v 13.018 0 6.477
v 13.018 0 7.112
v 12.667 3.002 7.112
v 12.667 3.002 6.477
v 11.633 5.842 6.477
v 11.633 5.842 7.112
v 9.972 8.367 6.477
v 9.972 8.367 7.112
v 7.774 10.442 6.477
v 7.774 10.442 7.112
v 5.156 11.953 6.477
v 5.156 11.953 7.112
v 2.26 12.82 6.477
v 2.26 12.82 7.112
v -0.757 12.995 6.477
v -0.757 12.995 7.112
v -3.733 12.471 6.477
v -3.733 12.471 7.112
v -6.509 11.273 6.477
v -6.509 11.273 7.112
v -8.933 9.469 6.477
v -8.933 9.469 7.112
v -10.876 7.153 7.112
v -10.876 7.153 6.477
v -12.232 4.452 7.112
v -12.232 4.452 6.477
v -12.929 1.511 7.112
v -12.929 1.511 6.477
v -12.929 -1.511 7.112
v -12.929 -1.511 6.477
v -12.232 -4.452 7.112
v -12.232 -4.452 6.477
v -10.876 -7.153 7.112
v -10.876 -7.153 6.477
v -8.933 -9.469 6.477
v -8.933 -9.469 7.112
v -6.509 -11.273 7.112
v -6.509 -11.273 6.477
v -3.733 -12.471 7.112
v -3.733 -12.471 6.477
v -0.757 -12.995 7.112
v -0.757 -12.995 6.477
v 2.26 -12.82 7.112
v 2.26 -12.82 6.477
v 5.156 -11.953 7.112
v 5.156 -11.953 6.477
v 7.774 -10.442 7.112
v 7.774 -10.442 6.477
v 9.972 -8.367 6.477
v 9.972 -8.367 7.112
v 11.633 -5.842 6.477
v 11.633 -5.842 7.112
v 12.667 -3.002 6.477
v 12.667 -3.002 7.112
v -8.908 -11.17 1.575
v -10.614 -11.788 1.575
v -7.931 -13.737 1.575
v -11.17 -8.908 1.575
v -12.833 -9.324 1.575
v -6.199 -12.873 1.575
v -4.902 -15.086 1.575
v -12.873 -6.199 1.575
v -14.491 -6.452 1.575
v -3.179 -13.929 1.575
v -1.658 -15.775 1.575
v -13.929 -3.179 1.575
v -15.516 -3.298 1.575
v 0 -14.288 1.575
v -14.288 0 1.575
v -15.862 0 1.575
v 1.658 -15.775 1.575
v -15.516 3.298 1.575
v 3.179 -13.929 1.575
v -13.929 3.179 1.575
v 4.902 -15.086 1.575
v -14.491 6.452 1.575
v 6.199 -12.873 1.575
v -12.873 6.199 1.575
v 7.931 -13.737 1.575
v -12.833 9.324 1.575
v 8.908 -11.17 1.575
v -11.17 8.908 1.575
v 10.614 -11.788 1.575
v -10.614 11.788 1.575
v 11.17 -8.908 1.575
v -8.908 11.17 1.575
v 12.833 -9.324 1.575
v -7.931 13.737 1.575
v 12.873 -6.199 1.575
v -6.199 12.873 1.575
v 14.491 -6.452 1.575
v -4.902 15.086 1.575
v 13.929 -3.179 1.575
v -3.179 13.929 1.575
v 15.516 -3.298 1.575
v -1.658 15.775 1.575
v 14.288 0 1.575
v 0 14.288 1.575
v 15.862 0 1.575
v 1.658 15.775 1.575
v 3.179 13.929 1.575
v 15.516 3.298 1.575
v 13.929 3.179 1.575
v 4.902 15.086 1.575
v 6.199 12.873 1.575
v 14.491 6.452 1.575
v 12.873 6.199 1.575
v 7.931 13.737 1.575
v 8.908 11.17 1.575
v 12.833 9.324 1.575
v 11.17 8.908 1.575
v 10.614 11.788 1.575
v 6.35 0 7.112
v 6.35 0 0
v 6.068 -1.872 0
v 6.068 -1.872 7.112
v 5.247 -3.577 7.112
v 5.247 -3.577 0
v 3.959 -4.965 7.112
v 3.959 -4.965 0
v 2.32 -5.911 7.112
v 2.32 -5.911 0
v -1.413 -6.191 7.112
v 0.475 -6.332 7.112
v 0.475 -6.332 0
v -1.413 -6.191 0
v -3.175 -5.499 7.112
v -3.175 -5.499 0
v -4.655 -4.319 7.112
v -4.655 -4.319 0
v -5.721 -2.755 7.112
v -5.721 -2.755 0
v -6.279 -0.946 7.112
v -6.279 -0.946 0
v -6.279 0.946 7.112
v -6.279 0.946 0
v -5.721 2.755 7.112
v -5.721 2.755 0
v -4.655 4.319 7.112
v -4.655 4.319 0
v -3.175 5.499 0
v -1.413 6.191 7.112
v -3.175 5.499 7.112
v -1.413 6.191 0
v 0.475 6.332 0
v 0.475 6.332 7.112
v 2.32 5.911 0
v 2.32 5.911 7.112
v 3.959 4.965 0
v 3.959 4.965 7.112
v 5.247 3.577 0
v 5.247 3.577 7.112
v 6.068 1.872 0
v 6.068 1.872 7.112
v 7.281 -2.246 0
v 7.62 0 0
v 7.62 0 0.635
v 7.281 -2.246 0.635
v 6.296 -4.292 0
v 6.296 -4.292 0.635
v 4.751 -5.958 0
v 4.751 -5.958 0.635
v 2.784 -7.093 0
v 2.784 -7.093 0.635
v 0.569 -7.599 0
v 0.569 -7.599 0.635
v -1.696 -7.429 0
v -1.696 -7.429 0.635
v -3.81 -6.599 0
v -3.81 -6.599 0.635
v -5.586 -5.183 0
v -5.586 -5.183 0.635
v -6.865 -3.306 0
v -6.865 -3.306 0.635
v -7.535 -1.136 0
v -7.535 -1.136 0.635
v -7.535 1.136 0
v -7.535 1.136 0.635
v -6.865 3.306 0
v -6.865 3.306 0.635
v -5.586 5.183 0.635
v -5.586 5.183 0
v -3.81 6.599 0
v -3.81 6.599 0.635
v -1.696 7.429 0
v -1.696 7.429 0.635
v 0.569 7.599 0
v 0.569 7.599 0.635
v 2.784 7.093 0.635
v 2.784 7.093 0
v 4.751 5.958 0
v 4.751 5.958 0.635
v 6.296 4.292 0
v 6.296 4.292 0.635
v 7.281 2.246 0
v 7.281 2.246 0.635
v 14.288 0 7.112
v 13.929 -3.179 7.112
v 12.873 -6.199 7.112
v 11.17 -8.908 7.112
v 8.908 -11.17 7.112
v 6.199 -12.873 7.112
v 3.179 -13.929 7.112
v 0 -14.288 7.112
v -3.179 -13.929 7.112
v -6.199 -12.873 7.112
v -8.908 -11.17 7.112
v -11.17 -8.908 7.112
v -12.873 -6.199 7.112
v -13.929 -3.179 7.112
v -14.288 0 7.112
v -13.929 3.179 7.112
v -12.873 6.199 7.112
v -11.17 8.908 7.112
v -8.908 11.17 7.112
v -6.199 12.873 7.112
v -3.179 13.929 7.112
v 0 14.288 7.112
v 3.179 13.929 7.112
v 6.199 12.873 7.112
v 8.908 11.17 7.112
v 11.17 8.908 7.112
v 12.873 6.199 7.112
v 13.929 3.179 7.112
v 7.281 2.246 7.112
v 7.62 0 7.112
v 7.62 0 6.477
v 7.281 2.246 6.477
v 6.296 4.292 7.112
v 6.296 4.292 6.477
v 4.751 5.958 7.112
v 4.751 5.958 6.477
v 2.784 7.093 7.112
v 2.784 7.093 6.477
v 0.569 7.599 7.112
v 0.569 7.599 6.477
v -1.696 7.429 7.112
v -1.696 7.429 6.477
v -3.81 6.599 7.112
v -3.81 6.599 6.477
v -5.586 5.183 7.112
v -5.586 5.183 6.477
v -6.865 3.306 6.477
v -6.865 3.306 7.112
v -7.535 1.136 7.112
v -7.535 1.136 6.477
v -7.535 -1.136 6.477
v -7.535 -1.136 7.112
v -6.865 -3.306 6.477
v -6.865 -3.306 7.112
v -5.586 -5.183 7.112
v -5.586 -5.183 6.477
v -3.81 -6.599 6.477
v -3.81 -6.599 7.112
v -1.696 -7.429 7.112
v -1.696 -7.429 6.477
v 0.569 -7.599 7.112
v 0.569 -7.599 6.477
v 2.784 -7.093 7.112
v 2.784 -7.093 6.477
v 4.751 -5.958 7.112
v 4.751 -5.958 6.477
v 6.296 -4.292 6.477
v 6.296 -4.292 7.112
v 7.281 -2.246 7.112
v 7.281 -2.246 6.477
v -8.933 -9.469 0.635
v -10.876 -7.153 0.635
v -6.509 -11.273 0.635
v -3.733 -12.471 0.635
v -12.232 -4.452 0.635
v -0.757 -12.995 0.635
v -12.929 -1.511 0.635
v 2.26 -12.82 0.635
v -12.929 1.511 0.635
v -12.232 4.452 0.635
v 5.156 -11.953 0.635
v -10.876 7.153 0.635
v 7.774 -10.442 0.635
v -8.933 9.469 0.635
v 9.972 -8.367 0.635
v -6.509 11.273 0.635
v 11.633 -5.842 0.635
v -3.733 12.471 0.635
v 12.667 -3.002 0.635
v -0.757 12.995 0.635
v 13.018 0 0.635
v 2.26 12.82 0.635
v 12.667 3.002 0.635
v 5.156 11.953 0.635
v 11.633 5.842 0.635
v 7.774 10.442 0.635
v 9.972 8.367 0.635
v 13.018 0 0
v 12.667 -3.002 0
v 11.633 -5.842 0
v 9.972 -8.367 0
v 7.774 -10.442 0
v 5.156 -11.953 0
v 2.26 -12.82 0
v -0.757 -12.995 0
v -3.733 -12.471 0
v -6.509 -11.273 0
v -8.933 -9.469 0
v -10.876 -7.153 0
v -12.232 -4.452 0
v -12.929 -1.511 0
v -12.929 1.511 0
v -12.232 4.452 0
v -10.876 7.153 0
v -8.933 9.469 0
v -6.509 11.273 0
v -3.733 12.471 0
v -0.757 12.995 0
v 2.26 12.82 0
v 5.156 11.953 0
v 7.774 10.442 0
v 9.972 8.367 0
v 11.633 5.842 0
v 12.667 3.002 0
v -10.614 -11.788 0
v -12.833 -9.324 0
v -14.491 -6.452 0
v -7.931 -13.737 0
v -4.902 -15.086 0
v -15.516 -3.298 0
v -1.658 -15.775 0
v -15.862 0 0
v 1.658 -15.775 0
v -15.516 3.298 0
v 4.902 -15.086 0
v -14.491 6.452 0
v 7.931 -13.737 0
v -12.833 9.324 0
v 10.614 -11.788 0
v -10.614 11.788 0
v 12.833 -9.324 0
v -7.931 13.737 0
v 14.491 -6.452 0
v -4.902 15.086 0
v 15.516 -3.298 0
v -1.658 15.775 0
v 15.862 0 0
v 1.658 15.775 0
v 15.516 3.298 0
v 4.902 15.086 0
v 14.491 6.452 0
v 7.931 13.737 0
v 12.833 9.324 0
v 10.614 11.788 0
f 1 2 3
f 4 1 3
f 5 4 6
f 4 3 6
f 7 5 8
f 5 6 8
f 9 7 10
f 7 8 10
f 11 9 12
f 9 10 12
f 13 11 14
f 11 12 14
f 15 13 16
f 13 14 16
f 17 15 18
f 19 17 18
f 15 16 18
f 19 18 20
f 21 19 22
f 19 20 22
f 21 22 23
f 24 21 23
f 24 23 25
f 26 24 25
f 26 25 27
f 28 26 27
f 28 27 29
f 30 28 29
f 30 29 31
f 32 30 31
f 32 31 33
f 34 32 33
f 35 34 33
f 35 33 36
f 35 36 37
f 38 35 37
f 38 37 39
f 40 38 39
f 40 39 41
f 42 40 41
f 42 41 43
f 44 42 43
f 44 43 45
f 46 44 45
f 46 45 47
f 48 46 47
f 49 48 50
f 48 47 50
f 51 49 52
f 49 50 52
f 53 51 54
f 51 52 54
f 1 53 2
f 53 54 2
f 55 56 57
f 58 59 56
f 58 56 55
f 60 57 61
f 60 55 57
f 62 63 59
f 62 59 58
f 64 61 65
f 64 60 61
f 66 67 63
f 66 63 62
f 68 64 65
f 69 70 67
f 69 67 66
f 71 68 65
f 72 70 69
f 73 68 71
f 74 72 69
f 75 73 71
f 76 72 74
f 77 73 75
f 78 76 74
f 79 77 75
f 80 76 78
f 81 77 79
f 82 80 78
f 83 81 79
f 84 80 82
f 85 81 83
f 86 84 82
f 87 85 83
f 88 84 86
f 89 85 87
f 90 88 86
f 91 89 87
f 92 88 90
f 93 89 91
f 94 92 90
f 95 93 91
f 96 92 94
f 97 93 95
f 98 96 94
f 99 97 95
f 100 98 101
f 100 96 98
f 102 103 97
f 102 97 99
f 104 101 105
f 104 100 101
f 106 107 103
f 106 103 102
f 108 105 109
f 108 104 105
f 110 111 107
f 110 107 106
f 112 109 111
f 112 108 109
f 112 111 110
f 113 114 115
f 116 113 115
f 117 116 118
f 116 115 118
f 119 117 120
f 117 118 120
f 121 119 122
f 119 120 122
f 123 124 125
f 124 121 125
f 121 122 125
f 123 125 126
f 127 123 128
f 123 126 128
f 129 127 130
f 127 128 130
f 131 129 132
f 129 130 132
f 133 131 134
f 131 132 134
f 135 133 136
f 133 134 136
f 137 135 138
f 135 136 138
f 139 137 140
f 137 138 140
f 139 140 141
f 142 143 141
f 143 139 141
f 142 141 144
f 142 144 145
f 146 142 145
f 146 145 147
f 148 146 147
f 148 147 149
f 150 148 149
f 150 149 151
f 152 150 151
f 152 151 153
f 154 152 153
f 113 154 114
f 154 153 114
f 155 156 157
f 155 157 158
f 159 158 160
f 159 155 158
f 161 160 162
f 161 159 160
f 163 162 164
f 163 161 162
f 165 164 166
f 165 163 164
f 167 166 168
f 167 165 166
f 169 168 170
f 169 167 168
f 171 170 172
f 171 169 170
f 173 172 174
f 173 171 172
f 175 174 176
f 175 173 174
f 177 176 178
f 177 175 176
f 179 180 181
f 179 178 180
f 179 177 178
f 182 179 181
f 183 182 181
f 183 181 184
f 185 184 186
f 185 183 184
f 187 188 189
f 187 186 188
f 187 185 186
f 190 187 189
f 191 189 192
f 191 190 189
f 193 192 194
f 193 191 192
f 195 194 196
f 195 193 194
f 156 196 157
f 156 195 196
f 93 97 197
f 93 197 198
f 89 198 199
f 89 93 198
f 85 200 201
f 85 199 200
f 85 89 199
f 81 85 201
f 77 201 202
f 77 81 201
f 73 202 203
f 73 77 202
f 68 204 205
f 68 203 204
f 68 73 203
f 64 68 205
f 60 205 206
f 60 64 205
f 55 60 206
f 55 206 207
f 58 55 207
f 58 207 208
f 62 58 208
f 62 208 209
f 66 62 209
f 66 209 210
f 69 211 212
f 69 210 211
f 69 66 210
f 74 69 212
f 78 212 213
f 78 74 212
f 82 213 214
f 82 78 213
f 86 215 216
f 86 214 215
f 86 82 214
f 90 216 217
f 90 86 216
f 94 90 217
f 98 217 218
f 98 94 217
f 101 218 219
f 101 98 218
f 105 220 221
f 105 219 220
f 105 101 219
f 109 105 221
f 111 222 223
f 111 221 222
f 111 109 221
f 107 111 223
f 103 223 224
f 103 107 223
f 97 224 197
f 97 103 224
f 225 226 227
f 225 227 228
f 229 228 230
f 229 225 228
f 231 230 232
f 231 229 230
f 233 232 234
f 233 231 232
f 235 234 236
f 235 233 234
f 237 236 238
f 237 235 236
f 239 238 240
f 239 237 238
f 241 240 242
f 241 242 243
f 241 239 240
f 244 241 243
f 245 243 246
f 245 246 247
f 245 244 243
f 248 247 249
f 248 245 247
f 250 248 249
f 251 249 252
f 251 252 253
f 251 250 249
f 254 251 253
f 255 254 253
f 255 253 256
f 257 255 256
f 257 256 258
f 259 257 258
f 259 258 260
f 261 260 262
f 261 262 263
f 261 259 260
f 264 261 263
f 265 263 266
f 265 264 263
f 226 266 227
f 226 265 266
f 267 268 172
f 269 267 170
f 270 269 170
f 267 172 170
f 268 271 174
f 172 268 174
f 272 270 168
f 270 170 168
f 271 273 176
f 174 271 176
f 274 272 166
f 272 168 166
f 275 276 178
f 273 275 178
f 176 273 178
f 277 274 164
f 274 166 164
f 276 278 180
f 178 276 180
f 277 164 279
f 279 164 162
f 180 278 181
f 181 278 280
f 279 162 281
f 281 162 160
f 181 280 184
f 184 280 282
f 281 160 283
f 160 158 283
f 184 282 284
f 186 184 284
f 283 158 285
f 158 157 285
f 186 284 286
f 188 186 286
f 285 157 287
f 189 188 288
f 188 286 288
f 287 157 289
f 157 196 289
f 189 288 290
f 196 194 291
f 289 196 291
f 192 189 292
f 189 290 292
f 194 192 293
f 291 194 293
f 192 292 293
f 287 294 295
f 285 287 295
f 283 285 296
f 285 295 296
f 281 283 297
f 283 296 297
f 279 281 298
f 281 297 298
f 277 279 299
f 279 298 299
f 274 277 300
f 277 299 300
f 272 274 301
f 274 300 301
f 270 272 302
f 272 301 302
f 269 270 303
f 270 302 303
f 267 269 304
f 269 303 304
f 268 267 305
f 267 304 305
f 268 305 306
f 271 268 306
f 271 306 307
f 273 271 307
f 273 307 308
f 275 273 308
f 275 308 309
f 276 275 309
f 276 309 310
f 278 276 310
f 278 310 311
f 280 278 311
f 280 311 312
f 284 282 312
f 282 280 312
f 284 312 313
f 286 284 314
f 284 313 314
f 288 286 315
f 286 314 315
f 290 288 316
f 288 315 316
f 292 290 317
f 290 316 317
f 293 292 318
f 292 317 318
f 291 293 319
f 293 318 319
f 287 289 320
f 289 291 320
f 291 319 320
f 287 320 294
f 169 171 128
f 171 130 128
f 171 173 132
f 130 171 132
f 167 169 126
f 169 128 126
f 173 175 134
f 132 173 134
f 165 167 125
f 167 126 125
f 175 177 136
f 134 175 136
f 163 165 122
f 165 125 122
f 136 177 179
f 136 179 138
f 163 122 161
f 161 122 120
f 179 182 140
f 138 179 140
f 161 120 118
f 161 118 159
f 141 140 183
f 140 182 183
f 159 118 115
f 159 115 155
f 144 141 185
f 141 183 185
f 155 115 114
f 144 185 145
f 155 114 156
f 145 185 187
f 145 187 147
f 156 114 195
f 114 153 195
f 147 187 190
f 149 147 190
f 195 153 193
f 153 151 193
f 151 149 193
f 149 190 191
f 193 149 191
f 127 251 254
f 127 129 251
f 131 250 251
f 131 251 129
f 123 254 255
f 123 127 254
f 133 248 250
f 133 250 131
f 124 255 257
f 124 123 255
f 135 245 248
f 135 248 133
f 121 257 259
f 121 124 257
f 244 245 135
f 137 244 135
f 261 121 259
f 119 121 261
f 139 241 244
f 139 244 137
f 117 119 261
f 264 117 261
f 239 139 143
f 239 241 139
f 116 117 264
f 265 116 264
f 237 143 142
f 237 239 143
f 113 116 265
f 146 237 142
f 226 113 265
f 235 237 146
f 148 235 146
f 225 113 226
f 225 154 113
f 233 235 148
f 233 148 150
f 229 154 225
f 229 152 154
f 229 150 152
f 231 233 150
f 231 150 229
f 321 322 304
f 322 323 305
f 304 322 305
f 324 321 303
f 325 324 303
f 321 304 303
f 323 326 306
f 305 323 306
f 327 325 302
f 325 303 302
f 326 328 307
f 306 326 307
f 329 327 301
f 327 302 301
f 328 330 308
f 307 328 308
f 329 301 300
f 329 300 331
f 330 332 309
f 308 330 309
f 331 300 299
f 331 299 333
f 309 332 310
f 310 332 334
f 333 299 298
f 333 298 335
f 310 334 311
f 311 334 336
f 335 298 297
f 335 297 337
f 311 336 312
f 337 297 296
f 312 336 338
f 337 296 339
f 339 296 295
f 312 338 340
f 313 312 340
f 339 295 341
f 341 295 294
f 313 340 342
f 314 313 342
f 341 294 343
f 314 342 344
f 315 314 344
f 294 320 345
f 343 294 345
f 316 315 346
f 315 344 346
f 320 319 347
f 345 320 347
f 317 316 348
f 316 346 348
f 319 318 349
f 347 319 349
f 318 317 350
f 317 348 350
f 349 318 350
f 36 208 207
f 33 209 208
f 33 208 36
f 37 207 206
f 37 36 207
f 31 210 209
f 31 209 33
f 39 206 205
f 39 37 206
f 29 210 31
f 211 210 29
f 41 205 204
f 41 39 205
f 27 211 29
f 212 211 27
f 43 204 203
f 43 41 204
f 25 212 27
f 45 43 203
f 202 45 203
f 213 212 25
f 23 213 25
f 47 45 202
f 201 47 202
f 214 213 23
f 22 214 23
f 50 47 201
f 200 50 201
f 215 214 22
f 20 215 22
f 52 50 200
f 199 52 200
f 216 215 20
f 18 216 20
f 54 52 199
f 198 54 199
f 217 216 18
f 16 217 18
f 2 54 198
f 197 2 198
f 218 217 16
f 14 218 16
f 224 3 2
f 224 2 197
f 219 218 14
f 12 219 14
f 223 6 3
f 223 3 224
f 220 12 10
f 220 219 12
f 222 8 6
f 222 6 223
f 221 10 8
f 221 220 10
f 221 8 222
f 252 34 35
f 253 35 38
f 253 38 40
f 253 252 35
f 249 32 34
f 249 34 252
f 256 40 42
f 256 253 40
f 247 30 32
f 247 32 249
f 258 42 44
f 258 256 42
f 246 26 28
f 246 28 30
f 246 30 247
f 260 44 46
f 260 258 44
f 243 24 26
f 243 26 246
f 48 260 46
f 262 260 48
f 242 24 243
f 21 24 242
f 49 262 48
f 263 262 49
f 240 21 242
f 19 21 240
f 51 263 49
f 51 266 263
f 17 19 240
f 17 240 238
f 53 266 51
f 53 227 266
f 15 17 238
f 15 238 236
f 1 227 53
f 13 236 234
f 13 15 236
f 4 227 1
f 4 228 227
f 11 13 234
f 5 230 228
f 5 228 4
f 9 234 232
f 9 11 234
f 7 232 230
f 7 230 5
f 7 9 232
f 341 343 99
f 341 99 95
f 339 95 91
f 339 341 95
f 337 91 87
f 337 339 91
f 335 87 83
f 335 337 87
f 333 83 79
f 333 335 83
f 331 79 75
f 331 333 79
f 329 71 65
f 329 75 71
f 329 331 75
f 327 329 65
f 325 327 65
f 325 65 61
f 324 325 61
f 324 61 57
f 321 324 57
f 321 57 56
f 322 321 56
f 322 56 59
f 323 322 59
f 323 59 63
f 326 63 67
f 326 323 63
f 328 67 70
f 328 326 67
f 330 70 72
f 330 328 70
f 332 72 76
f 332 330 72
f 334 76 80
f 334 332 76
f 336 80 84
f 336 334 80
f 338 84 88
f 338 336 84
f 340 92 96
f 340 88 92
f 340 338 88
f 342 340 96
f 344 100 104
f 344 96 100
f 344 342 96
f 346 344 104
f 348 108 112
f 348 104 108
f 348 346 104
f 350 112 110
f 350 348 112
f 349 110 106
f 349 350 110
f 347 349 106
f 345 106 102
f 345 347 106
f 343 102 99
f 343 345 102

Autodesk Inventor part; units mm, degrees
ref_plane "YZ Plane" through (0, 0, 0) normal (1, 0, 0) x (0, 1, 0)
ref_plane "XZ Plane" through (0, 0, 0) normal (0, 1, 0) x (-1, 0, 0)
ref_plane "XY Plane" through (0, 0, 0) normal (0, 0, 1) x (1, 0, 0)
sketch "Sketch1" plane through (0, 0, 0) normal (0, 0, 1) x (1, 0, 0)
  circle A0 centre (0, 0) radius 6.35
  circle A1 centre (0, 0) radius 14.2875
  circle A2 centre (0, 0) radius 15.8623
  circle A3 centre (0, 0) radius 7.62
  circle A4 centre (0, 0) radius 13.0175
  dimension "d0" = 12.7
  dimension "d1" = 28.575
  dimension "d2" = 31.7246
  dimension "d7" = 15.24
  dimension "d8" = 26.035
extrude "Extrusion1" add sketch "Sketch1" along normal blind 7.112 contours A1 | A3 | A4
extrude "Extrusion2" add sketch "Sketch1" along normal blind 1.5748 contours A2
extrude "Extrusion3" cut sketch "Sketch1" along normal blind 0.635 contours A4
sketch "Sketch2" plane through (0, 0, 7.112) normal (0, 0, 1) x (1, 0, 0)
  circle A0 centre (0, 0) radius 7.62 projected
  circle A1 centre (0, 0) radius 13.0175 projected
extrude "Extrusion4" cut sketch "Sketch2" against normal blind 0.635
properties part number ".5 id 1.125 od flange bearing"
